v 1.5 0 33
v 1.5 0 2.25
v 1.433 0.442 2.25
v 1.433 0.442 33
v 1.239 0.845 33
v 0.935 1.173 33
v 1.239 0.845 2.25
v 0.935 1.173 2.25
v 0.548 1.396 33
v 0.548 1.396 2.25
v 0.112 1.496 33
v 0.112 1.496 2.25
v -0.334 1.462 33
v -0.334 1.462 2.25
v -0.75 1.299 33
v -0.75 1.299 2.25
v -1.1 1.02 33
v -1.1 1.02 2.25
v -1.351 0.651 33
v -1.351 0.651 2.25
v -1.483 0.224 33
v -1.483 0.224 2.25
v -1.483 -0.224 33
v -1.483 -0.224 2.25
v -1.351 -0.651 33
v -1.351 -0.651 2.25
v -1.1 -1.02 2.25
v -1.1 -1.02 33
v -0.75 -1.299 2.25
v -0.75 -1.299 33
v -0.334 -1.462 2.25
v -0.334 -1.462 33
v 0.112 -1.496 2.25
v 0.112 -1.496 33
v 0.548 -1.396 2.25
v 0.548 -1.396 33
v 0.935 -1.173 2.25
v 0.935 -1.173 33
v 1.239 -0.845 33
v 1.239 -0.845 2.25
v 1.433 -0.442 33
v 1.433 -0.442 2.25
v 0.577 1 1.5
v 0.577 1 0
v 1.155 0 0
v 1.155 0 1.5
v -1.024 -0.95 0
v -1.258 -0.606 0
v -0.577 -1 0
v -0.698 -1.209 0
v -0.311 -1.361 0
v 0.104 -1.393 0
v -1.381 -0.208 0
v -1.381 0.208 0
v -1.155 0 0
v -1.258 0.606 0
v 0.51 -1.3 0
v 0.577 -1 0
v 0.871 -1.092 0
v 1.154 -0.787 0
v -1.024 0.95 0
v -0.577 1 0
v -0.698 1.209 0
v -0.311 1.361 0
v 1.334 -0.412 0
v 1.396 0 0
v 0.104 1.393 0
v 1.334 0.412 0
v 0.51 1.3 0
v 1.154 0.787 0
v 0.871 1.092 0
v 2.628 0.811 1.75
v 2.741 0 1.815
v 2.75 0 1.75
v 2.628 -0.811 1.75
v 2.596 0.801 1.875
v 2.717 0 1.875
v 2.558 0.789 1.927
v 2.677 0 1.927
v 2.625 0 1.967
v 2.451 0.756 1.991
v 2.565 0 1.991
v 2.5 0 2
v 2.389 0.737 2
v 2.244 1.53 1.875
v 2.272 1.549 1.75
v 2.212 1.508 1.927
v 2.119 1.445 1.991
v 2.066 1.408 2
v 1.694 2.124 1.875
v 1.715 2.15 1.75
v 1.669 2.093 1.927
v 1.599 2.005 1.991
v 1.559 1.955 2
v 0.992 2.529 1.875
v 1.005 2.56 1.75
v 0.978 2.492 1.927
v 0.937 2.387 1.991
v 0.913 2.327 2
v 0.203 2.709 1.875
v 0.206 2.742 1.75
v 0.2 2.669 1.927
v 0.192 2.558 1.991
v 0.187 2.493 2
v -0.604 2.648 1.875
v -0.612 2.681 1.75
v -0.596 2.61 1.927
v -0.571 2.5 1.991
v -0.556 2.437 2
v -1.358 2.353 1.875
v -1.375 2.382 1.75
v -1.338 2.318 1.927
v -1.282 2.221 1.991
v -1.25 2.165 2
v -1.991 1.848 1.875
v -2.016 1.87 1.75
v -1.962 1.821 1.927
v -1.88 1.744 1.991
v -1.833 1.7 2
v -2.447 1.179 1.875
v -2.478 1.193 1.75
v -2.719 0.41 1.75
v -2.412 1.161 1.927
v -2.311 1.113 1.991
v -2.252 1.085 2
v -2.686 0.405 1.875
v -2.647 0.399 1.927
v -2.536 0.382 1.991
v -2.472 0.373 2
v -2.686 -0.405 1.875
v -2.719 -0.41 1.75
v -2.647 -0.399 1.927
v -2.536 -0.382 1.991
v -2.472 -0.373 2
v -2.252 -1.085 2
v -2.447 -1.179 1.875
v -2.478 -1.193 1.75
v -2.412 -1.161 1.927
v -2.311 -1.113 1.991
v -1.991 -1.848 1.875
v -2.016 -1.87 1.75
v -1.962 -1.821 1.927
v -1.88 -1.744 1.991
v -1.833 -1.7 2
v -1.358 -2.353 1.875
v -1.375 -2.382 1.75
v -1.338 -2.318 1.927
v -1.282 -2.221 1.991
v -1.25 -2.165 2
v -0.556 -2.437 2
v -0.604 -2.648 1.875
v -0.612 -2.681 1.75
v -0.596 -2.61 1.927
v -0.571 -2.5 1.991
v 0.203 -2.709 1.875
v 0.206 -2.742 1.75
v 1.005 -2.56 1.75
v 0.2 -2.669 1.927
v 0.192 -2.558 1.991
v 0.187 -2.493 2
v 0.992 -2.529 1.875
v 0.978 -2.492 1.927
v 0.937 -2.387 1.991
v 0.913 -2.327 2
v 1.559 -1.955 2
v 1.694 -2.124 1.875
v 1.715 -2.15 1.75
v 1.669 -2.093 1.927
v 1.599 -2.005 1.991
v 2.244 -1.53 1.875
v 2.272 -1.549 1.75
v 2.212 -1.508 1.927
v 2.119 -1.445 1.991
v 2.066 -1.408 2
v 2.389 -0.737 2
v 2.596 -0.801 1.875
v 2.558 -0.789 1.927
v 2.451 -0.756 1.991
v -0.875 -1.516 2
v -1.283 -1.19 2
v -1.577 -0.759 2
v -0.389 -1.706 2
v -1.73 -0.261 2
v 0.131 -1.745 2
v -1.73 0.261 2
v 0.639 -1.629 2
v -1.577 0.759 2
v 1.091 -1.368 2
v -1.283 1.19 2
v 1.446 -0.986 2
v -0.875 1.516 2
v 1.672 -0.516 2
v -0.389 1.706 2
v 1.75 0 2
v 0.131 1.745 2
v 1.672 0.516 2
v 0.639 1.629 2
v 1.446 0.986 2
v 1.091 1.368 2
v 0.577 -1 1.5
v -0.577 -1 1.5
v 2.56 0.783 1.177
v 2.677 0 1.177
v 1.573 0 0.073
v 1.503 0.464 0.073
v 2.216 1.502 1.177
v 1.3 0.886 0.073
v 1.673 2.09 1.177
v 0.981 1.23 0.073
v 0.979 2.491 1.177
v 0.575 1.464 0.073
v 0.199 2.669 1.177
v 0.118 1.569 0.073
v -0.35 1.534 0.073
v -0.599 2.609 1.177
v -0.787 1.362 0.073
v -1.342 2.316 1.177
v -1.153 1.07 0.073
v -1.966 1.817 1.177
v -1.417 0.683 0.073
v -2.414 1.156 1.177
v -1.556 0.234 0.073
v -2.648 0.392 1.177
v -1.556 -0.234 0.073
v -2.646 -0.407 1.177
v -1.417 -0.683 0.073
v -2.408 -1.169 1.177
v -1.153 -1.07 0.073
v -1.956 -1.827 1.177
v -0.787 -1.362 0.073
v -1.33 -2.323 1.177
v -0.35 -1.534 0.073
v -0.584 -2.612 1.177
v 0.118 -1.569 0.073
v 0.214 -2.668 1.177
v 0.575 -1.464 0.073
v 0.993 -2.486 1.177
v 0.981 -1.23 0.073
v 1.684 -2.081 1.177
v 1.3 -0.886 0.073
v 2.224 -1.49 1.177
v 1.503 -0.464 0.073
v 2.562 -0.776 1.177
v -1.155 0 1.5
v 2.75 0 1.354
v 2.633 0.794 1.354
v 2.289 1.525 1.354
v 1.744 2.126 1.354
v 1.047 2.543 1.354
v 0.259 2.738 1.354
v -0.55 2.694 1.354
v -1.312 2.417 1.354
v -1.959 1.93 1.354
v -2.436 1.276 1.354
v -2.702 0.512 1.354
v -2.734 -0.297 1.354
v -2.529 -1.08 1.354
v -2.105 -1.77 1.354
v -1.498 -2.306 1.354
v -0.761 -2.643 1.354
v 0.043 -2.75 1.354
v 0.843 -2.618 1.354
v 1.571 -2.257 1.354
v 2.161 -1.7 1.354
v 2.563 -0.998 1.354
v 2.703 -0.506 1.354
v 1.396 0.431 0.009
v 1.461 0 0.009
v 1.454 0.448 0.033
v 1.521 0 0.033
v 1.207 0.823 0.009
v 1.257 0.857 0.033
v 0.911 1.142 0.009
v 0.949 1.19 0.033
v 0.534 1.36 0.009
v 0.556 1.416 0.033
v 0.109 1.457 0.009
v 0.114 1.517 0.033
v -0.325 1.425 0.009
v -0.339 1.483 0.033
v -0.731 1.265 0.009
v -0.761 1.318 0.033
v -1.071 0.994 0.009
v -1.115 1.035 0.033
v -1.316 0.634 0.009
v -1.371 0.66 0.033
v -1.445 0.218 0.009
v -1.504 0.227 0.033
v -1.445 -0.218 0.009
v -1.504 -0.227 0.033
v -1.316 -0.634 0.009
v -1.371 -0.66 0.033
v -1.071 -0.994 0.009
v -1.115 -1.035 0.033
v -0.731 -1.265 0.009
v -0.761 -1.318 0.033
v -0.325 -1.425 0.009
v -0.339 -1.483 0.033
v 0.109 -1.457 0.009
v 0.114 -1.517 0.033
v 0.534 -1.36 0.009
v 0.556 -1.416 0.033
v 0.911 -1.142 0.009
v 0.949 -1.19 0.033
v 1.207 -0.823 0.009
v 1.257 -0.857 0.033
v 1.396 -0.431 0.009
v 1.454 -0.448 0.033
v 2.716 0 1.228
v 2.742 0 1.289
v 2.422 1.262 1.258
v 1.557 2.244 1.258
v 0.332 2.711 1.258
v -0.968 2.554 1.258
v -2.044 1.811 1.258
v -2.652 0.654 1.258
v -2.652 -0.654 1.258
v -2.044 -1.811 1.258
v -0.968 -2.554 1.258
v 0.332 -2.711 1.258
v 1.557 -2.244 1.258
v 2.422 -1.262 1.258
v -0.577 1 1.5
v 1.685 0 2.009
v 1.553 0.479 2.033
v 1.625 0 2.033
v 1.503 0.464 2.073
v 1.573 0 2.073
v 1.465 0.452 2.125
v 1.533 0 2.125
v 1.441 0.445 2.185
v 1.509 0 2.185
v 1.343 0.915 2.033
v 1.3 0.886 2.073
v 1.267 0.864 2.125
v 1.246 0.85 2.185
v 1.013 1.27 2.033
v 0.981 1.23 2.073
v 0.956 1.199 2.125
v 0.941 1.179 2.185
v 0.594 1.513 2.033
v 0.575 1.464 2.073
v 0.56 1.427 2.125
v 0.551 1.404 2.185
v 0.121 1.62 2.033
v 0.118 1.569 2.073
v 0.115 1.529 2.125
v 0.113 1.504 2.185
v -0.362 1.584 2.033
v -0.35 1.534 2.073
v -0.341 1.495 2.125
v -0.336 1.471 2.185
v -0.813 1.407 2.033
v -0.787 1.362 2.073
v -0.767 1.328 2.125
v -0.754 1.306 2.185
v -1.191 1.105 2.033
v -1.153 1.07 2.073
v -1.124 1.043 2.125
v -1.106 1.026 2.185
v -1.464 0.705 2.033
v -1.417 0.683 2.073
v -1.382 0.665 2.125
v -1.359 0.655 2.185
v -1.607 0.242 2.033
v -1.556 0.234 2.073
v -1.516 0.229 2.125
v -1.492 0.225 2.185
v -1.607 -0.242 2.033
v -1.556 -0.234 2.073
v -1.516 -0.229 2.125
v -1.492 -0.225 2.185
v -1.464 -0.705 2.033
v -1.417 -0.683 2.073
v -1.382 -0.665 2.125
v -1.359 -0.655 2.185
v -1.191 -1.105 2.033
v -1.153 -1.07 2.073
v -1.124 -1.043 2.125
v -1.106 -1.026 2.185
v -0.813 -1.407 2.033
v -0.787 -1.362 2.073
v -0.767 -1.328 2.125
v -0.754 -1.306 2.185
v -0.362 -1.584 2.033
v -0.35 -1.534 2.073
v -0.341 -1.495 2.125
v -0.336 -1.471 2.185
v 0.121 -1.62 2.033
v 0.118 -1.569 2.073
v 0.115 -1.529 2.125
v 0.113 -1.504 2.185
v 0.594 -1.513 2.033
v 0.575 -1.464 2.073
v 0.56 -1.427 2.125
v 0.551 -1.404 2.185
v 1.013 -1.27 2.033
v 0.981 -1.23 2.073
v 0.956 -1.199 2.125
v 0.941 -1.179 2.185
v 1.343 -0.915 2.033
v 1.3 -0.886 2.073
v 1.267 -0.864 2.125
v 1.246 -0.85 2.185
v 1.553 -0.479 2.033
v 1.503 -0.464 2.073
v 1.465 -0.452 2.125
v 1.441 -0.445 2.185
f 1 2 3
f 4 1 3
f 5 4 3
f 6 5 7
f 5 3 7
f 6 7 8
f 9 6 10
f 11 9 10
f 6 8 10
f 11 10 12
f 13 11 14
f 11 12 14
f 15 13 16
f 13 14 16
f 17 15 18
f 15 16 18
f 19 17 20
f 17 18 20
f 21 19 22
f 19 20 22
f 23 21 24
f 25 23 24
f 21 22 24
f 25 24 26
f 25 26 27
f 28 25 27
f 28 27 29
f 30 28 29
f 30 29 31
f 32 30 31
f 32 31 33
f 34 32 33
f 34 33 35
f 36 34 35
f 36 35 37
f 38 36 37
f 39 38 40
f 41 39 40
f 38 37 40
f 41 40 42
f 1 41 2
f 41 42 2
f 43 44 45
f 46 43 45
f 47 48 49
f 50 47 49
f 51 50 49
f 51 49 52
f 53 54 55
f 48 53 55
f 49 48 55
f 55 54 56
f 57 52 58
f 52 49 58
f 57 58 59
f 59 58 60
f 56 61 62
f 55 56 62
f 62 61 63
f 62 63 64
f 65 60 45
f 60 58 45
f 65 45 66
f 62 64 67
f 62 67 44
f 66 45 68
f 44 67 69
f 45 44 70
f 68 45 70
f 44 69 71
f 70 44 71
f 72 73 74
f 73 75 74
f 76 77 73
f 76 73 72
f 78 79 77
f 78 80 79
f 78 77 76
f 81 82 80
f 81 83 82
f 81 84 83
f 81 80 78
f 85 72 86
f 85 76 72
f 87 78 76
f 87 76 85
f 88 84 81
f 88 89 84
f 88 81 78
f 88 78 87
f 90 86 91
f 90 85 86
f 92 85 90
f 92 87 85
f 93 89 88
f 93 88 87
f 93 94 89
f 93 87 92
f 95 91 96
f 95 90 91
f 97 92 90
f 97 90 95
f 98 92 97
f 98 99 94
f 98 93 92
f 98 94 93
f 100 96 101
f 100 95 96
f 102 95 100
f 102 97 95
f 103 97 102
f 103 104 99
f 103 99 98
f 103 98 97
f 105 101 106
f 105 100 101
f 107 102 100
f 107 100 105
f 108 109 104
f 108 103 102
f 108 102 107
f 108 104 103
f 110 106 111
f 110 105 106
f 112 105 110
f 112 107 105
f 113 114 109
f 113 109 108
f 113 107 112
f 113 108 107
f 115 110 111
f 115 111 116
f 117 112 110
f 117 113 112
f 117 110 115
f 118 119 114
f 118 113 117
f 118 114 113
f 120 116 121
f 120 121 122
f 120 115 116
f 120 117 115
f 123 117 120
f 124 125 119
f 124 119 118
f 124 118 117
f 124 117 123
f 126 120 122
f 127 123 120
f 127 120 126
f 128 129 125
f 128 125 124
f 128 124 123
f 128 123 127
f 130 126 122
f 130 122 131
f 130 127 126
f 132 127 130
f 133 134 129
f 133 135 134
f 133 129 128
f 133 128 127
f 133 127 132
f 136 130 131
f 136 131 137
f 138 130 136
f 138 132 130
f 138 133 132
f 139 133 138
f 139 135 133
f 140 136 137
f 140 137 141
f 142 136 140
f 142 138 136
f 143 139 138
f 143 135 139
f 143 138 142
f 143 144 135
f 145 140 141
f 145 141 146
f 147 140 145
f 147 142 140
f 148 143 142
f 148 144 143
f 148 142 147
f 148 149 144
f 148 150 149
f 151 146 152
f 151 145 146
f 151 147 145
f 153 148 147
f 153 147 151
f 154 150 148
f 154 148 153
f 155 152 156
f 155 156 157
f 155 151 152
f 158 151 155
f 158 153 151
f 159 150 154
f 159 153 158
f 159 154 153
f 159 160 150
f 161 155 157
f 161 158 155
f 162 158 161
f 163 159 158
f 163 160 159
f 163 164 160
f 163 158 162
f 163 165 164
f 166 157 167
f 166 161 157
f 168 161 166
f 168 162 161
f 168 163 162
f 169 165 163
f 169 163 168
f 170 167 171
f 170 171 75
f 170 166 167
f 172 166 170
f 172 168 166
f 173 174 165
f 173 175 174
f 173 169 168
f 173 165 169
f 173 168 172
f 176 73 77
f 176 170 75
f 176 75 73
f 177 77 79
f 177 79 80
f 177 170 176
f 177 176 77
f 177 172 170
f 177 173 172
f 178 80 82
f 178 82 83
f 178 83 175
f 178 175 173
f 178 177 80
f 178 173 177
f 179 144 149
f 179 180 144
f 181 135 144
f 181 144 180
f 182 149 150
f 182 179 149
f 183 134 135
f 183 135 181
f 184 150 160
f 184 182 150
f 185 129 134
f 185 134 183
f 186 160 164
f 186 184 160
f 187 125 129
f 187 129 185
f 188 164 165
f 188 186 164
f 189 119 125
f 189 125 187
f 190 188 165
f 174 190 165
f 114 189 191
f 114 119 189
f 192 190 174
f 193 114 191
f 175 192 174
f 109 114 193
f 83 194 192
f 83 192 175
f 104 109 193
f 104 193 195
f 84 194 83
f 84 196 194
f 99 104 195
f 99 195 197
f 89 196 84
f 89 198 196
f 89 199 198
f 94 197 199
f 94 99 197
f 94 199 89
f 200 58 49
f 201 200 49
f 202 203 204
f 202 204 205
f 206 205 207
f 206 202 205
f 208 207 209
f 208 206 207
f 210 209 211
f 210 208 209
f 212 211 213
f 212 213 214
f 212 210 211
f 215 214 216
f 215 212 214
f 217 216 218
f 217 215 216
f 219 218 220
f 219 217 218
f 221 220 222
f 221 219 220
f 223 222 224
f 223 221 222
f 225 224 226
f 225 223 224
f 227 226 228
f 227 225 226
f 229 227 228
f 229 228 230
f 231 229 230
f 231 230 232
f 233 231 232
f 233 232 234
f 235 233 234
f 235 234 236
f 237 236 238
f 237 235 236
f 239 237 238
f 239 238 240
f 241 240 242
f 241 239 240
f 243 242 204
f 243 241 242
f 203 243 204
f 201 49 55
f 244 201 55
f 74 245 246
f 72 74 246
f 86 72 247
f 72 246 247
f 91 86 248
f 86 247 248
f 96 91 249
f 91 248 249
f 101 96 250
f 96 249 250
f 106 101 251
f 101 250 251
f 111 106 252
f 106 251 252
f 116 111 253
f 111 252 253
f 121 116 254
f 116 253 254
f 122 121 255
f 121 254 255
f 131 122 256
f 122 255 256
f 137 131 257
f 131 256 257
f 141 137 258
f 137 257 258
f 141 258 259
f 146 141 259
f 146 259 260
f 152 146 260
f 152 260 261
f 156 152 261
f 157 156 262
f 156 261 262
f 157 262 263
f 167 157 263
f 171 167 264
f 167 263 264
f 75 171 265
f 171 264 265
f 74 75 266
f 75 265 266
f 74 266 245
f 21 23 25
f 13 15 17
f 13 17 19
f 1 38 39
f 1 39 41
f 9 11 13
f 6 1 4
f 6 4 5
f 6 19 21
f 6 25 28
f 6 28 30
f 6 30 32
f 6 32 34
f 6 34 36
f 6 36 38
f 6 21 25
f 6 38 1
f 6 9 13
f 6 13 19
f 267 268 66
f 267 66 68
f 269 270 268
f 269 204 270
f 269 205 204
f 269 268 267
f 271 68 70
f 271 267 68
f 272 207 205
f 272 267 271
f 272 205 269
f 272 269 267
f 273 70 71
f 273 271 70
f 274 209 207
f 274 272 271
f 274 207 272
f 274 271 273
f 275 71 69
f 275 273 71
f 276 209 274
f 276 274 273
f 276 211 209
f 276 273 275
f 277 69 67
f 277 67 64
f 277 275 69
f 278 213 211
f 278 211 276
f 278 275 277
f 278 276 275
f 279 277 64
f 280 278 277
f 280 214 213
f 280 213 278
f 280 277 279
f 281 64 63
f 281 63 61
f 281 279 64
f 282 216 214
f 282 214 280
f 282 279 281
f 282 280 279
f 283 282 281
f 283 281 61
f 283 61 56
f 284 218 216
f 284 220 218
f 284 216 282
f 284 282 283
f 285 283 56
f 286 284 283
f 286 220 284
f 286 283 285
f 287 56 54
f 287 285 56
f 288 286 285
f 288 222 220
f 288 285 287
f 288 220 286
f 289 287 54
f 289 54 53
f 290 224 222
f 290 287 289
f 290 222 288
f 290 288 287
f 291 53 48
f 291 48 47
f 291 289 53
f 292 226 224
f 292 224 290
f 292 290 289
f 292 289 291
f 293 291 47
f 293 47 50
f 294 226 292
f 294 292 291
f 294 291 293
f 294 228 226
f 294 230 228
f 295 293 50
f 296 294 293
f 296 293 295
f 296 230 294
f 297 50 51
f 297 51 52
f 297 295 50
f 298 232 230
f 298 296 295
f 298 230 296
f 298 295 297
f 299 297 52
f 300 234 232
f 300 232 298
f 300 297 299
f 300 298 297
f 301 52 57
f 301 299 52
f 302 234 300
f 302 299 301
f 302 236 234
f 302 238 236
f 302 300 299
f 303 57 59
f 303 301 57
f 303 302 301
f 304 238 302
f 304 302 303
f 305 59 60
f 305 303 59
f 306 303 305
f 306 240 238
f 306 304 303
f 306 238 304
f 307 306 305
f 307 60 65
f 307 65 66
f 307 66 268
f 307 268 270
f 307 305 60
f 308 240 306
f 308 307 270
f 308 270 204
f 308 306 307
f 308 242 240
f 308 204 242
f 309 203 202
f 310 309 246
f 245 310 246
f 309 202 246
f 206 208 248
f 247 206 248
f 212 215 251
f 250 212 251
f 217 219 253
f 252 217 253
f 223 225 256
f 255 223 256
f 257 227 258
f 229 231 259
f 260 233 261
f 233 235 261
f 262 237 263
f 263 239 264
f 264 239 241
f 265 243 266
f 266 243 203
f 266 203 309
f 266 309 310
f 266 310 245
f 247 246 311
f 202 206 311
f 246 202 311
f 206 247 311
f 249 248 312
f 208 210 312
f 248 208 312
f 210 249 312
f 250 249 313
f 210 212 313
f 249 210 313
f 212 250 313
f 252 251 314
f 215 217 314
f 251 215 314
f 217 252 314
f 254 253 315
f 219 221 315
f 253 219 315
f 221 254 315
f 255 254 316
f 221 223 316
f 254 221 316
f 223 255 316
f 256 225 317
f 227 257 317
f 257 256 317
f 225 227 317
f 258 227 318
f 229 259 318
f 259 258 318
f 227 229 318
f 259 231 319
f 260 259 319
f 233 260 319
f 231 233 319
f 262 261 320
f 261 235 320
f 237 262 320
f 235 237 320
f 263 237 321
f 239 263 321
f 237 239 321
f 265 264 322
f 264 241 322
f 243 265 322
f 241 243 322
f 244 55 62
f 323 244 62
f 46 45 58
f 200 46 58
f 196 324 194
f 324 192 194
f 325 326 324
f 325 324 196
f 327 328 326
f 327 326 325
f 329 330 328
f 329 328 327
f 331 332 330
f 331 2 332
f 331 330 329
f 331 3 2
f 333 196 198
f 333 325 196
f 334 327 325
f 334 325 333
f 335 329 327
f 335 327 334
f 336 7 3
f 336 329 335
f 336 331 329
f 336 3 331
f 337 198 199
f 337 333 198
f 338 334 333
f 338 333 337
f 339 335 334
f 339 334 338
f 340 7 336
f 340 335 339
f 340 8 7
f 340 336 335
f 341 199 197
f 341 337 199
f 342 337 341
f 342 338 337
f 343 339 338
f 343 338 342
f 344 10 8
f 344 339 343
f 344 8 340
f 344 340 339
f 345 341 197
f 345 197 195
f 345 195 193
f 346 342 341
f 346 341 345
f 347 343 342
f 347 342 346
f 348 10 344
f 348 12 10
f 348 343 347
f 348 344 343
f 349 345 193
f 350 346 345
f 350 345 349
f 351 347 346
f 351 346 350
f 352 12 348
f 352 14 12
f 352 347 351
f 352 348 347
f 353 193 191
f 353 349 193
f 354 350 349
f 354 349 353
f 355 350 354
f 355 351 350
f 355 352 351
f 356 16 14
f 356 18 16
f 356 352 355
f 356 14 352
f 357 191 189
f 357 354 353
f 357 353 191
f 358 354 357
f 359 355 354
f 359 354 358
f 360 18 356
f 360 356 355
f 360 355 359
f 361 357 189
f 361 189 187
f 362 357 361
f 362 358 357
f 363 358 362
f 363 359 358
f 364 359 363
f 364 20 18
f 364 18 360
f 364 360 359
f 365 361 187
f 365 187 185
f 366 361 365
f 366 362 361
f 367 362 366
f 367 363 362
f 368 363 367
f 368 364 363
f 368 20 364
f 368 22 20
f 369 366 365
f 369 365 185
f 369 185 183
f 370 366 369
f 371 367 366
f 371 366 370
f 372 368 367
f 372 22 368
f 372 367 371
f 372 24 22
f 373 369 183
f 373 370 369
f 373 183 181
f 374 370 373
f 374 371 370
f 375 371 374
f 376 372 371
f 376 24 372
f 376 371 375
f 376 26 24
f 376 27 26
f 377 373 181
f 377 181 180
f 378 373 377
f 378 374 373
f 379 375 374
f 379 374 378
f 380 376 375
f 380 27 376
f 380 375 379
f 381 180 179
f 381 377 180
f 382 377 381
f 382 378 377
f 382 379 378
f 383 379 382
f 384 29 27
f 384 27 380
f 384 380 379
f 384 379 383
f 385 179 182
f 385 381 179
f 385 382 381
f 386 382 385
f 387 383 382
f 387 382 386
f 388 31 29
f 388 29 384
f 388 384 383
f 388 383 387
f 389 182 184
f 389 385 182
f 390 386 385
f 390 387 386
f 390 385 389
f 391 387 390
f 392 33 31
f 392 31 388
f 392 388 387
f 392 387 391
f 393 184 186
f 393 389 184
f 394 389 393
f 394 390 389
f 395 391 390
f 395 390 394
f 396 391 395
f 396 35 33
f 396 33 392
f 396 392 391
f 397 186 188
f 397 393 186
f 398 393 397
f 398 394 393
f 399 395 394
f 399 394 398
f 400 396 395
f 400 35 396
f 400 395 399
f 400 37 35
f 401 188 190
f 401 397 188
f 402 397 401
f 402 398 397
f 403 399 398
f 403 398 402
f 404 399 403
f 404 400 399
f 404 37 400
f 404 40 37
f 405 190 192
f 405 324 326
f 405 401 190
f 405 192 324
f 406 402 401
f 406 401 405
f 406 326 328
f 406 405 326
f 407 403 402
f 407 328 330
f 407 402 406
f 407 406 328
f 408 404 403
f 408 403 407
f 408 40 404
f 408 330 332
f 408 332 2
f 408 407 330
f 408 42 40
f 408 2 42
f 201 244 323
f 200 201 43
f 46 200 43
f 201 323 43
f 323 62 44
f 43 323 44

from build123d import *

# Parameters (mm, degrees)
F1_R     = 2.75
F1_R_2   = 1.5
F2_DEPTH = 2
F3_START = 1.5
F3_DEPTH = 0.5
F4_START = 2
F4_DEPTH = 31
F5_SIZE2 = 1.25
F5_SIZE  = 1.25
F6_R     = 0.25


# Not quite as in the source:
# - a feature names something its author has since deleted; it is built from what else it names


with BuildPart() as f2:
    # F1 (on Top) → F2 (new body)
    with BuildSketch(Plane.XY):
        Circle(F1_R)
        Circle(F1_R_2, mode=Mode.SUBTRACT)
        Circle(F1_R_2)
        Polygon((-0.5773502692, -1), (-1.1547005384, 0), (-0.5773502692, 1), (0.5773502692, 1), (1.1547005384, 0), (0.5773502692, -1), align=None, mode=Mode.SUBTRACT)
    extrude(amount=F2_DEPTH)

    # F1 (on Top) → F3 (join)
    with BuildSketch(Plane.XY.offset(F3_START)):
        Polygon((-0.5773502692, 1), (-1.1547005384, 0), (-0.5773502692, -1), (0.5773502692, -1), (1.1547005384, 0), (0.5773502692, 1), align=None)
    extrude(amount=F3_DEPTH)

    # F1 (on Top) → F4 (join)
    with BuildSketch(Plane.XY.offset(F4_START)):
        Circle(F1_R_2)
        Polygon((-0.5773502692, -1), (-1.1547005384, 0), (-0.5773502692, 1), (0.5773502692, 1), (1.1547005384, 0), (0.5773502692, -1), align=None, mode=Mode.SUBTRACT)
        Polygon((-0.5773502692, 1), (-1.1547005384, 0), (-0.5773502692, -1), (0.5773502692, -1), (1.1547005384, 0), (0.5773502692, 1), align=None)
    extrude(amount=F4_DEPTH)

    # F5
    f5_edges = [f2.edges().sort_by_distance(p)[0] for p in [
        (-2.75, 0, 0),
    ]]
    chamfer(f5_edges, length=F5_SIZE, length2=F5_SIZE2)

    # F6
    f6_edges = [f2.edges().sort_by_distance(p)[0] for p in [
        (-2.75, 0, 2),
        (-1.5, 0, 2),
        (-1.5, 0, 0),
        (-2.75, 0, 1.25),
    ]]
    fillet(f6_edges, radius=F6_R)


solid = f2.part
